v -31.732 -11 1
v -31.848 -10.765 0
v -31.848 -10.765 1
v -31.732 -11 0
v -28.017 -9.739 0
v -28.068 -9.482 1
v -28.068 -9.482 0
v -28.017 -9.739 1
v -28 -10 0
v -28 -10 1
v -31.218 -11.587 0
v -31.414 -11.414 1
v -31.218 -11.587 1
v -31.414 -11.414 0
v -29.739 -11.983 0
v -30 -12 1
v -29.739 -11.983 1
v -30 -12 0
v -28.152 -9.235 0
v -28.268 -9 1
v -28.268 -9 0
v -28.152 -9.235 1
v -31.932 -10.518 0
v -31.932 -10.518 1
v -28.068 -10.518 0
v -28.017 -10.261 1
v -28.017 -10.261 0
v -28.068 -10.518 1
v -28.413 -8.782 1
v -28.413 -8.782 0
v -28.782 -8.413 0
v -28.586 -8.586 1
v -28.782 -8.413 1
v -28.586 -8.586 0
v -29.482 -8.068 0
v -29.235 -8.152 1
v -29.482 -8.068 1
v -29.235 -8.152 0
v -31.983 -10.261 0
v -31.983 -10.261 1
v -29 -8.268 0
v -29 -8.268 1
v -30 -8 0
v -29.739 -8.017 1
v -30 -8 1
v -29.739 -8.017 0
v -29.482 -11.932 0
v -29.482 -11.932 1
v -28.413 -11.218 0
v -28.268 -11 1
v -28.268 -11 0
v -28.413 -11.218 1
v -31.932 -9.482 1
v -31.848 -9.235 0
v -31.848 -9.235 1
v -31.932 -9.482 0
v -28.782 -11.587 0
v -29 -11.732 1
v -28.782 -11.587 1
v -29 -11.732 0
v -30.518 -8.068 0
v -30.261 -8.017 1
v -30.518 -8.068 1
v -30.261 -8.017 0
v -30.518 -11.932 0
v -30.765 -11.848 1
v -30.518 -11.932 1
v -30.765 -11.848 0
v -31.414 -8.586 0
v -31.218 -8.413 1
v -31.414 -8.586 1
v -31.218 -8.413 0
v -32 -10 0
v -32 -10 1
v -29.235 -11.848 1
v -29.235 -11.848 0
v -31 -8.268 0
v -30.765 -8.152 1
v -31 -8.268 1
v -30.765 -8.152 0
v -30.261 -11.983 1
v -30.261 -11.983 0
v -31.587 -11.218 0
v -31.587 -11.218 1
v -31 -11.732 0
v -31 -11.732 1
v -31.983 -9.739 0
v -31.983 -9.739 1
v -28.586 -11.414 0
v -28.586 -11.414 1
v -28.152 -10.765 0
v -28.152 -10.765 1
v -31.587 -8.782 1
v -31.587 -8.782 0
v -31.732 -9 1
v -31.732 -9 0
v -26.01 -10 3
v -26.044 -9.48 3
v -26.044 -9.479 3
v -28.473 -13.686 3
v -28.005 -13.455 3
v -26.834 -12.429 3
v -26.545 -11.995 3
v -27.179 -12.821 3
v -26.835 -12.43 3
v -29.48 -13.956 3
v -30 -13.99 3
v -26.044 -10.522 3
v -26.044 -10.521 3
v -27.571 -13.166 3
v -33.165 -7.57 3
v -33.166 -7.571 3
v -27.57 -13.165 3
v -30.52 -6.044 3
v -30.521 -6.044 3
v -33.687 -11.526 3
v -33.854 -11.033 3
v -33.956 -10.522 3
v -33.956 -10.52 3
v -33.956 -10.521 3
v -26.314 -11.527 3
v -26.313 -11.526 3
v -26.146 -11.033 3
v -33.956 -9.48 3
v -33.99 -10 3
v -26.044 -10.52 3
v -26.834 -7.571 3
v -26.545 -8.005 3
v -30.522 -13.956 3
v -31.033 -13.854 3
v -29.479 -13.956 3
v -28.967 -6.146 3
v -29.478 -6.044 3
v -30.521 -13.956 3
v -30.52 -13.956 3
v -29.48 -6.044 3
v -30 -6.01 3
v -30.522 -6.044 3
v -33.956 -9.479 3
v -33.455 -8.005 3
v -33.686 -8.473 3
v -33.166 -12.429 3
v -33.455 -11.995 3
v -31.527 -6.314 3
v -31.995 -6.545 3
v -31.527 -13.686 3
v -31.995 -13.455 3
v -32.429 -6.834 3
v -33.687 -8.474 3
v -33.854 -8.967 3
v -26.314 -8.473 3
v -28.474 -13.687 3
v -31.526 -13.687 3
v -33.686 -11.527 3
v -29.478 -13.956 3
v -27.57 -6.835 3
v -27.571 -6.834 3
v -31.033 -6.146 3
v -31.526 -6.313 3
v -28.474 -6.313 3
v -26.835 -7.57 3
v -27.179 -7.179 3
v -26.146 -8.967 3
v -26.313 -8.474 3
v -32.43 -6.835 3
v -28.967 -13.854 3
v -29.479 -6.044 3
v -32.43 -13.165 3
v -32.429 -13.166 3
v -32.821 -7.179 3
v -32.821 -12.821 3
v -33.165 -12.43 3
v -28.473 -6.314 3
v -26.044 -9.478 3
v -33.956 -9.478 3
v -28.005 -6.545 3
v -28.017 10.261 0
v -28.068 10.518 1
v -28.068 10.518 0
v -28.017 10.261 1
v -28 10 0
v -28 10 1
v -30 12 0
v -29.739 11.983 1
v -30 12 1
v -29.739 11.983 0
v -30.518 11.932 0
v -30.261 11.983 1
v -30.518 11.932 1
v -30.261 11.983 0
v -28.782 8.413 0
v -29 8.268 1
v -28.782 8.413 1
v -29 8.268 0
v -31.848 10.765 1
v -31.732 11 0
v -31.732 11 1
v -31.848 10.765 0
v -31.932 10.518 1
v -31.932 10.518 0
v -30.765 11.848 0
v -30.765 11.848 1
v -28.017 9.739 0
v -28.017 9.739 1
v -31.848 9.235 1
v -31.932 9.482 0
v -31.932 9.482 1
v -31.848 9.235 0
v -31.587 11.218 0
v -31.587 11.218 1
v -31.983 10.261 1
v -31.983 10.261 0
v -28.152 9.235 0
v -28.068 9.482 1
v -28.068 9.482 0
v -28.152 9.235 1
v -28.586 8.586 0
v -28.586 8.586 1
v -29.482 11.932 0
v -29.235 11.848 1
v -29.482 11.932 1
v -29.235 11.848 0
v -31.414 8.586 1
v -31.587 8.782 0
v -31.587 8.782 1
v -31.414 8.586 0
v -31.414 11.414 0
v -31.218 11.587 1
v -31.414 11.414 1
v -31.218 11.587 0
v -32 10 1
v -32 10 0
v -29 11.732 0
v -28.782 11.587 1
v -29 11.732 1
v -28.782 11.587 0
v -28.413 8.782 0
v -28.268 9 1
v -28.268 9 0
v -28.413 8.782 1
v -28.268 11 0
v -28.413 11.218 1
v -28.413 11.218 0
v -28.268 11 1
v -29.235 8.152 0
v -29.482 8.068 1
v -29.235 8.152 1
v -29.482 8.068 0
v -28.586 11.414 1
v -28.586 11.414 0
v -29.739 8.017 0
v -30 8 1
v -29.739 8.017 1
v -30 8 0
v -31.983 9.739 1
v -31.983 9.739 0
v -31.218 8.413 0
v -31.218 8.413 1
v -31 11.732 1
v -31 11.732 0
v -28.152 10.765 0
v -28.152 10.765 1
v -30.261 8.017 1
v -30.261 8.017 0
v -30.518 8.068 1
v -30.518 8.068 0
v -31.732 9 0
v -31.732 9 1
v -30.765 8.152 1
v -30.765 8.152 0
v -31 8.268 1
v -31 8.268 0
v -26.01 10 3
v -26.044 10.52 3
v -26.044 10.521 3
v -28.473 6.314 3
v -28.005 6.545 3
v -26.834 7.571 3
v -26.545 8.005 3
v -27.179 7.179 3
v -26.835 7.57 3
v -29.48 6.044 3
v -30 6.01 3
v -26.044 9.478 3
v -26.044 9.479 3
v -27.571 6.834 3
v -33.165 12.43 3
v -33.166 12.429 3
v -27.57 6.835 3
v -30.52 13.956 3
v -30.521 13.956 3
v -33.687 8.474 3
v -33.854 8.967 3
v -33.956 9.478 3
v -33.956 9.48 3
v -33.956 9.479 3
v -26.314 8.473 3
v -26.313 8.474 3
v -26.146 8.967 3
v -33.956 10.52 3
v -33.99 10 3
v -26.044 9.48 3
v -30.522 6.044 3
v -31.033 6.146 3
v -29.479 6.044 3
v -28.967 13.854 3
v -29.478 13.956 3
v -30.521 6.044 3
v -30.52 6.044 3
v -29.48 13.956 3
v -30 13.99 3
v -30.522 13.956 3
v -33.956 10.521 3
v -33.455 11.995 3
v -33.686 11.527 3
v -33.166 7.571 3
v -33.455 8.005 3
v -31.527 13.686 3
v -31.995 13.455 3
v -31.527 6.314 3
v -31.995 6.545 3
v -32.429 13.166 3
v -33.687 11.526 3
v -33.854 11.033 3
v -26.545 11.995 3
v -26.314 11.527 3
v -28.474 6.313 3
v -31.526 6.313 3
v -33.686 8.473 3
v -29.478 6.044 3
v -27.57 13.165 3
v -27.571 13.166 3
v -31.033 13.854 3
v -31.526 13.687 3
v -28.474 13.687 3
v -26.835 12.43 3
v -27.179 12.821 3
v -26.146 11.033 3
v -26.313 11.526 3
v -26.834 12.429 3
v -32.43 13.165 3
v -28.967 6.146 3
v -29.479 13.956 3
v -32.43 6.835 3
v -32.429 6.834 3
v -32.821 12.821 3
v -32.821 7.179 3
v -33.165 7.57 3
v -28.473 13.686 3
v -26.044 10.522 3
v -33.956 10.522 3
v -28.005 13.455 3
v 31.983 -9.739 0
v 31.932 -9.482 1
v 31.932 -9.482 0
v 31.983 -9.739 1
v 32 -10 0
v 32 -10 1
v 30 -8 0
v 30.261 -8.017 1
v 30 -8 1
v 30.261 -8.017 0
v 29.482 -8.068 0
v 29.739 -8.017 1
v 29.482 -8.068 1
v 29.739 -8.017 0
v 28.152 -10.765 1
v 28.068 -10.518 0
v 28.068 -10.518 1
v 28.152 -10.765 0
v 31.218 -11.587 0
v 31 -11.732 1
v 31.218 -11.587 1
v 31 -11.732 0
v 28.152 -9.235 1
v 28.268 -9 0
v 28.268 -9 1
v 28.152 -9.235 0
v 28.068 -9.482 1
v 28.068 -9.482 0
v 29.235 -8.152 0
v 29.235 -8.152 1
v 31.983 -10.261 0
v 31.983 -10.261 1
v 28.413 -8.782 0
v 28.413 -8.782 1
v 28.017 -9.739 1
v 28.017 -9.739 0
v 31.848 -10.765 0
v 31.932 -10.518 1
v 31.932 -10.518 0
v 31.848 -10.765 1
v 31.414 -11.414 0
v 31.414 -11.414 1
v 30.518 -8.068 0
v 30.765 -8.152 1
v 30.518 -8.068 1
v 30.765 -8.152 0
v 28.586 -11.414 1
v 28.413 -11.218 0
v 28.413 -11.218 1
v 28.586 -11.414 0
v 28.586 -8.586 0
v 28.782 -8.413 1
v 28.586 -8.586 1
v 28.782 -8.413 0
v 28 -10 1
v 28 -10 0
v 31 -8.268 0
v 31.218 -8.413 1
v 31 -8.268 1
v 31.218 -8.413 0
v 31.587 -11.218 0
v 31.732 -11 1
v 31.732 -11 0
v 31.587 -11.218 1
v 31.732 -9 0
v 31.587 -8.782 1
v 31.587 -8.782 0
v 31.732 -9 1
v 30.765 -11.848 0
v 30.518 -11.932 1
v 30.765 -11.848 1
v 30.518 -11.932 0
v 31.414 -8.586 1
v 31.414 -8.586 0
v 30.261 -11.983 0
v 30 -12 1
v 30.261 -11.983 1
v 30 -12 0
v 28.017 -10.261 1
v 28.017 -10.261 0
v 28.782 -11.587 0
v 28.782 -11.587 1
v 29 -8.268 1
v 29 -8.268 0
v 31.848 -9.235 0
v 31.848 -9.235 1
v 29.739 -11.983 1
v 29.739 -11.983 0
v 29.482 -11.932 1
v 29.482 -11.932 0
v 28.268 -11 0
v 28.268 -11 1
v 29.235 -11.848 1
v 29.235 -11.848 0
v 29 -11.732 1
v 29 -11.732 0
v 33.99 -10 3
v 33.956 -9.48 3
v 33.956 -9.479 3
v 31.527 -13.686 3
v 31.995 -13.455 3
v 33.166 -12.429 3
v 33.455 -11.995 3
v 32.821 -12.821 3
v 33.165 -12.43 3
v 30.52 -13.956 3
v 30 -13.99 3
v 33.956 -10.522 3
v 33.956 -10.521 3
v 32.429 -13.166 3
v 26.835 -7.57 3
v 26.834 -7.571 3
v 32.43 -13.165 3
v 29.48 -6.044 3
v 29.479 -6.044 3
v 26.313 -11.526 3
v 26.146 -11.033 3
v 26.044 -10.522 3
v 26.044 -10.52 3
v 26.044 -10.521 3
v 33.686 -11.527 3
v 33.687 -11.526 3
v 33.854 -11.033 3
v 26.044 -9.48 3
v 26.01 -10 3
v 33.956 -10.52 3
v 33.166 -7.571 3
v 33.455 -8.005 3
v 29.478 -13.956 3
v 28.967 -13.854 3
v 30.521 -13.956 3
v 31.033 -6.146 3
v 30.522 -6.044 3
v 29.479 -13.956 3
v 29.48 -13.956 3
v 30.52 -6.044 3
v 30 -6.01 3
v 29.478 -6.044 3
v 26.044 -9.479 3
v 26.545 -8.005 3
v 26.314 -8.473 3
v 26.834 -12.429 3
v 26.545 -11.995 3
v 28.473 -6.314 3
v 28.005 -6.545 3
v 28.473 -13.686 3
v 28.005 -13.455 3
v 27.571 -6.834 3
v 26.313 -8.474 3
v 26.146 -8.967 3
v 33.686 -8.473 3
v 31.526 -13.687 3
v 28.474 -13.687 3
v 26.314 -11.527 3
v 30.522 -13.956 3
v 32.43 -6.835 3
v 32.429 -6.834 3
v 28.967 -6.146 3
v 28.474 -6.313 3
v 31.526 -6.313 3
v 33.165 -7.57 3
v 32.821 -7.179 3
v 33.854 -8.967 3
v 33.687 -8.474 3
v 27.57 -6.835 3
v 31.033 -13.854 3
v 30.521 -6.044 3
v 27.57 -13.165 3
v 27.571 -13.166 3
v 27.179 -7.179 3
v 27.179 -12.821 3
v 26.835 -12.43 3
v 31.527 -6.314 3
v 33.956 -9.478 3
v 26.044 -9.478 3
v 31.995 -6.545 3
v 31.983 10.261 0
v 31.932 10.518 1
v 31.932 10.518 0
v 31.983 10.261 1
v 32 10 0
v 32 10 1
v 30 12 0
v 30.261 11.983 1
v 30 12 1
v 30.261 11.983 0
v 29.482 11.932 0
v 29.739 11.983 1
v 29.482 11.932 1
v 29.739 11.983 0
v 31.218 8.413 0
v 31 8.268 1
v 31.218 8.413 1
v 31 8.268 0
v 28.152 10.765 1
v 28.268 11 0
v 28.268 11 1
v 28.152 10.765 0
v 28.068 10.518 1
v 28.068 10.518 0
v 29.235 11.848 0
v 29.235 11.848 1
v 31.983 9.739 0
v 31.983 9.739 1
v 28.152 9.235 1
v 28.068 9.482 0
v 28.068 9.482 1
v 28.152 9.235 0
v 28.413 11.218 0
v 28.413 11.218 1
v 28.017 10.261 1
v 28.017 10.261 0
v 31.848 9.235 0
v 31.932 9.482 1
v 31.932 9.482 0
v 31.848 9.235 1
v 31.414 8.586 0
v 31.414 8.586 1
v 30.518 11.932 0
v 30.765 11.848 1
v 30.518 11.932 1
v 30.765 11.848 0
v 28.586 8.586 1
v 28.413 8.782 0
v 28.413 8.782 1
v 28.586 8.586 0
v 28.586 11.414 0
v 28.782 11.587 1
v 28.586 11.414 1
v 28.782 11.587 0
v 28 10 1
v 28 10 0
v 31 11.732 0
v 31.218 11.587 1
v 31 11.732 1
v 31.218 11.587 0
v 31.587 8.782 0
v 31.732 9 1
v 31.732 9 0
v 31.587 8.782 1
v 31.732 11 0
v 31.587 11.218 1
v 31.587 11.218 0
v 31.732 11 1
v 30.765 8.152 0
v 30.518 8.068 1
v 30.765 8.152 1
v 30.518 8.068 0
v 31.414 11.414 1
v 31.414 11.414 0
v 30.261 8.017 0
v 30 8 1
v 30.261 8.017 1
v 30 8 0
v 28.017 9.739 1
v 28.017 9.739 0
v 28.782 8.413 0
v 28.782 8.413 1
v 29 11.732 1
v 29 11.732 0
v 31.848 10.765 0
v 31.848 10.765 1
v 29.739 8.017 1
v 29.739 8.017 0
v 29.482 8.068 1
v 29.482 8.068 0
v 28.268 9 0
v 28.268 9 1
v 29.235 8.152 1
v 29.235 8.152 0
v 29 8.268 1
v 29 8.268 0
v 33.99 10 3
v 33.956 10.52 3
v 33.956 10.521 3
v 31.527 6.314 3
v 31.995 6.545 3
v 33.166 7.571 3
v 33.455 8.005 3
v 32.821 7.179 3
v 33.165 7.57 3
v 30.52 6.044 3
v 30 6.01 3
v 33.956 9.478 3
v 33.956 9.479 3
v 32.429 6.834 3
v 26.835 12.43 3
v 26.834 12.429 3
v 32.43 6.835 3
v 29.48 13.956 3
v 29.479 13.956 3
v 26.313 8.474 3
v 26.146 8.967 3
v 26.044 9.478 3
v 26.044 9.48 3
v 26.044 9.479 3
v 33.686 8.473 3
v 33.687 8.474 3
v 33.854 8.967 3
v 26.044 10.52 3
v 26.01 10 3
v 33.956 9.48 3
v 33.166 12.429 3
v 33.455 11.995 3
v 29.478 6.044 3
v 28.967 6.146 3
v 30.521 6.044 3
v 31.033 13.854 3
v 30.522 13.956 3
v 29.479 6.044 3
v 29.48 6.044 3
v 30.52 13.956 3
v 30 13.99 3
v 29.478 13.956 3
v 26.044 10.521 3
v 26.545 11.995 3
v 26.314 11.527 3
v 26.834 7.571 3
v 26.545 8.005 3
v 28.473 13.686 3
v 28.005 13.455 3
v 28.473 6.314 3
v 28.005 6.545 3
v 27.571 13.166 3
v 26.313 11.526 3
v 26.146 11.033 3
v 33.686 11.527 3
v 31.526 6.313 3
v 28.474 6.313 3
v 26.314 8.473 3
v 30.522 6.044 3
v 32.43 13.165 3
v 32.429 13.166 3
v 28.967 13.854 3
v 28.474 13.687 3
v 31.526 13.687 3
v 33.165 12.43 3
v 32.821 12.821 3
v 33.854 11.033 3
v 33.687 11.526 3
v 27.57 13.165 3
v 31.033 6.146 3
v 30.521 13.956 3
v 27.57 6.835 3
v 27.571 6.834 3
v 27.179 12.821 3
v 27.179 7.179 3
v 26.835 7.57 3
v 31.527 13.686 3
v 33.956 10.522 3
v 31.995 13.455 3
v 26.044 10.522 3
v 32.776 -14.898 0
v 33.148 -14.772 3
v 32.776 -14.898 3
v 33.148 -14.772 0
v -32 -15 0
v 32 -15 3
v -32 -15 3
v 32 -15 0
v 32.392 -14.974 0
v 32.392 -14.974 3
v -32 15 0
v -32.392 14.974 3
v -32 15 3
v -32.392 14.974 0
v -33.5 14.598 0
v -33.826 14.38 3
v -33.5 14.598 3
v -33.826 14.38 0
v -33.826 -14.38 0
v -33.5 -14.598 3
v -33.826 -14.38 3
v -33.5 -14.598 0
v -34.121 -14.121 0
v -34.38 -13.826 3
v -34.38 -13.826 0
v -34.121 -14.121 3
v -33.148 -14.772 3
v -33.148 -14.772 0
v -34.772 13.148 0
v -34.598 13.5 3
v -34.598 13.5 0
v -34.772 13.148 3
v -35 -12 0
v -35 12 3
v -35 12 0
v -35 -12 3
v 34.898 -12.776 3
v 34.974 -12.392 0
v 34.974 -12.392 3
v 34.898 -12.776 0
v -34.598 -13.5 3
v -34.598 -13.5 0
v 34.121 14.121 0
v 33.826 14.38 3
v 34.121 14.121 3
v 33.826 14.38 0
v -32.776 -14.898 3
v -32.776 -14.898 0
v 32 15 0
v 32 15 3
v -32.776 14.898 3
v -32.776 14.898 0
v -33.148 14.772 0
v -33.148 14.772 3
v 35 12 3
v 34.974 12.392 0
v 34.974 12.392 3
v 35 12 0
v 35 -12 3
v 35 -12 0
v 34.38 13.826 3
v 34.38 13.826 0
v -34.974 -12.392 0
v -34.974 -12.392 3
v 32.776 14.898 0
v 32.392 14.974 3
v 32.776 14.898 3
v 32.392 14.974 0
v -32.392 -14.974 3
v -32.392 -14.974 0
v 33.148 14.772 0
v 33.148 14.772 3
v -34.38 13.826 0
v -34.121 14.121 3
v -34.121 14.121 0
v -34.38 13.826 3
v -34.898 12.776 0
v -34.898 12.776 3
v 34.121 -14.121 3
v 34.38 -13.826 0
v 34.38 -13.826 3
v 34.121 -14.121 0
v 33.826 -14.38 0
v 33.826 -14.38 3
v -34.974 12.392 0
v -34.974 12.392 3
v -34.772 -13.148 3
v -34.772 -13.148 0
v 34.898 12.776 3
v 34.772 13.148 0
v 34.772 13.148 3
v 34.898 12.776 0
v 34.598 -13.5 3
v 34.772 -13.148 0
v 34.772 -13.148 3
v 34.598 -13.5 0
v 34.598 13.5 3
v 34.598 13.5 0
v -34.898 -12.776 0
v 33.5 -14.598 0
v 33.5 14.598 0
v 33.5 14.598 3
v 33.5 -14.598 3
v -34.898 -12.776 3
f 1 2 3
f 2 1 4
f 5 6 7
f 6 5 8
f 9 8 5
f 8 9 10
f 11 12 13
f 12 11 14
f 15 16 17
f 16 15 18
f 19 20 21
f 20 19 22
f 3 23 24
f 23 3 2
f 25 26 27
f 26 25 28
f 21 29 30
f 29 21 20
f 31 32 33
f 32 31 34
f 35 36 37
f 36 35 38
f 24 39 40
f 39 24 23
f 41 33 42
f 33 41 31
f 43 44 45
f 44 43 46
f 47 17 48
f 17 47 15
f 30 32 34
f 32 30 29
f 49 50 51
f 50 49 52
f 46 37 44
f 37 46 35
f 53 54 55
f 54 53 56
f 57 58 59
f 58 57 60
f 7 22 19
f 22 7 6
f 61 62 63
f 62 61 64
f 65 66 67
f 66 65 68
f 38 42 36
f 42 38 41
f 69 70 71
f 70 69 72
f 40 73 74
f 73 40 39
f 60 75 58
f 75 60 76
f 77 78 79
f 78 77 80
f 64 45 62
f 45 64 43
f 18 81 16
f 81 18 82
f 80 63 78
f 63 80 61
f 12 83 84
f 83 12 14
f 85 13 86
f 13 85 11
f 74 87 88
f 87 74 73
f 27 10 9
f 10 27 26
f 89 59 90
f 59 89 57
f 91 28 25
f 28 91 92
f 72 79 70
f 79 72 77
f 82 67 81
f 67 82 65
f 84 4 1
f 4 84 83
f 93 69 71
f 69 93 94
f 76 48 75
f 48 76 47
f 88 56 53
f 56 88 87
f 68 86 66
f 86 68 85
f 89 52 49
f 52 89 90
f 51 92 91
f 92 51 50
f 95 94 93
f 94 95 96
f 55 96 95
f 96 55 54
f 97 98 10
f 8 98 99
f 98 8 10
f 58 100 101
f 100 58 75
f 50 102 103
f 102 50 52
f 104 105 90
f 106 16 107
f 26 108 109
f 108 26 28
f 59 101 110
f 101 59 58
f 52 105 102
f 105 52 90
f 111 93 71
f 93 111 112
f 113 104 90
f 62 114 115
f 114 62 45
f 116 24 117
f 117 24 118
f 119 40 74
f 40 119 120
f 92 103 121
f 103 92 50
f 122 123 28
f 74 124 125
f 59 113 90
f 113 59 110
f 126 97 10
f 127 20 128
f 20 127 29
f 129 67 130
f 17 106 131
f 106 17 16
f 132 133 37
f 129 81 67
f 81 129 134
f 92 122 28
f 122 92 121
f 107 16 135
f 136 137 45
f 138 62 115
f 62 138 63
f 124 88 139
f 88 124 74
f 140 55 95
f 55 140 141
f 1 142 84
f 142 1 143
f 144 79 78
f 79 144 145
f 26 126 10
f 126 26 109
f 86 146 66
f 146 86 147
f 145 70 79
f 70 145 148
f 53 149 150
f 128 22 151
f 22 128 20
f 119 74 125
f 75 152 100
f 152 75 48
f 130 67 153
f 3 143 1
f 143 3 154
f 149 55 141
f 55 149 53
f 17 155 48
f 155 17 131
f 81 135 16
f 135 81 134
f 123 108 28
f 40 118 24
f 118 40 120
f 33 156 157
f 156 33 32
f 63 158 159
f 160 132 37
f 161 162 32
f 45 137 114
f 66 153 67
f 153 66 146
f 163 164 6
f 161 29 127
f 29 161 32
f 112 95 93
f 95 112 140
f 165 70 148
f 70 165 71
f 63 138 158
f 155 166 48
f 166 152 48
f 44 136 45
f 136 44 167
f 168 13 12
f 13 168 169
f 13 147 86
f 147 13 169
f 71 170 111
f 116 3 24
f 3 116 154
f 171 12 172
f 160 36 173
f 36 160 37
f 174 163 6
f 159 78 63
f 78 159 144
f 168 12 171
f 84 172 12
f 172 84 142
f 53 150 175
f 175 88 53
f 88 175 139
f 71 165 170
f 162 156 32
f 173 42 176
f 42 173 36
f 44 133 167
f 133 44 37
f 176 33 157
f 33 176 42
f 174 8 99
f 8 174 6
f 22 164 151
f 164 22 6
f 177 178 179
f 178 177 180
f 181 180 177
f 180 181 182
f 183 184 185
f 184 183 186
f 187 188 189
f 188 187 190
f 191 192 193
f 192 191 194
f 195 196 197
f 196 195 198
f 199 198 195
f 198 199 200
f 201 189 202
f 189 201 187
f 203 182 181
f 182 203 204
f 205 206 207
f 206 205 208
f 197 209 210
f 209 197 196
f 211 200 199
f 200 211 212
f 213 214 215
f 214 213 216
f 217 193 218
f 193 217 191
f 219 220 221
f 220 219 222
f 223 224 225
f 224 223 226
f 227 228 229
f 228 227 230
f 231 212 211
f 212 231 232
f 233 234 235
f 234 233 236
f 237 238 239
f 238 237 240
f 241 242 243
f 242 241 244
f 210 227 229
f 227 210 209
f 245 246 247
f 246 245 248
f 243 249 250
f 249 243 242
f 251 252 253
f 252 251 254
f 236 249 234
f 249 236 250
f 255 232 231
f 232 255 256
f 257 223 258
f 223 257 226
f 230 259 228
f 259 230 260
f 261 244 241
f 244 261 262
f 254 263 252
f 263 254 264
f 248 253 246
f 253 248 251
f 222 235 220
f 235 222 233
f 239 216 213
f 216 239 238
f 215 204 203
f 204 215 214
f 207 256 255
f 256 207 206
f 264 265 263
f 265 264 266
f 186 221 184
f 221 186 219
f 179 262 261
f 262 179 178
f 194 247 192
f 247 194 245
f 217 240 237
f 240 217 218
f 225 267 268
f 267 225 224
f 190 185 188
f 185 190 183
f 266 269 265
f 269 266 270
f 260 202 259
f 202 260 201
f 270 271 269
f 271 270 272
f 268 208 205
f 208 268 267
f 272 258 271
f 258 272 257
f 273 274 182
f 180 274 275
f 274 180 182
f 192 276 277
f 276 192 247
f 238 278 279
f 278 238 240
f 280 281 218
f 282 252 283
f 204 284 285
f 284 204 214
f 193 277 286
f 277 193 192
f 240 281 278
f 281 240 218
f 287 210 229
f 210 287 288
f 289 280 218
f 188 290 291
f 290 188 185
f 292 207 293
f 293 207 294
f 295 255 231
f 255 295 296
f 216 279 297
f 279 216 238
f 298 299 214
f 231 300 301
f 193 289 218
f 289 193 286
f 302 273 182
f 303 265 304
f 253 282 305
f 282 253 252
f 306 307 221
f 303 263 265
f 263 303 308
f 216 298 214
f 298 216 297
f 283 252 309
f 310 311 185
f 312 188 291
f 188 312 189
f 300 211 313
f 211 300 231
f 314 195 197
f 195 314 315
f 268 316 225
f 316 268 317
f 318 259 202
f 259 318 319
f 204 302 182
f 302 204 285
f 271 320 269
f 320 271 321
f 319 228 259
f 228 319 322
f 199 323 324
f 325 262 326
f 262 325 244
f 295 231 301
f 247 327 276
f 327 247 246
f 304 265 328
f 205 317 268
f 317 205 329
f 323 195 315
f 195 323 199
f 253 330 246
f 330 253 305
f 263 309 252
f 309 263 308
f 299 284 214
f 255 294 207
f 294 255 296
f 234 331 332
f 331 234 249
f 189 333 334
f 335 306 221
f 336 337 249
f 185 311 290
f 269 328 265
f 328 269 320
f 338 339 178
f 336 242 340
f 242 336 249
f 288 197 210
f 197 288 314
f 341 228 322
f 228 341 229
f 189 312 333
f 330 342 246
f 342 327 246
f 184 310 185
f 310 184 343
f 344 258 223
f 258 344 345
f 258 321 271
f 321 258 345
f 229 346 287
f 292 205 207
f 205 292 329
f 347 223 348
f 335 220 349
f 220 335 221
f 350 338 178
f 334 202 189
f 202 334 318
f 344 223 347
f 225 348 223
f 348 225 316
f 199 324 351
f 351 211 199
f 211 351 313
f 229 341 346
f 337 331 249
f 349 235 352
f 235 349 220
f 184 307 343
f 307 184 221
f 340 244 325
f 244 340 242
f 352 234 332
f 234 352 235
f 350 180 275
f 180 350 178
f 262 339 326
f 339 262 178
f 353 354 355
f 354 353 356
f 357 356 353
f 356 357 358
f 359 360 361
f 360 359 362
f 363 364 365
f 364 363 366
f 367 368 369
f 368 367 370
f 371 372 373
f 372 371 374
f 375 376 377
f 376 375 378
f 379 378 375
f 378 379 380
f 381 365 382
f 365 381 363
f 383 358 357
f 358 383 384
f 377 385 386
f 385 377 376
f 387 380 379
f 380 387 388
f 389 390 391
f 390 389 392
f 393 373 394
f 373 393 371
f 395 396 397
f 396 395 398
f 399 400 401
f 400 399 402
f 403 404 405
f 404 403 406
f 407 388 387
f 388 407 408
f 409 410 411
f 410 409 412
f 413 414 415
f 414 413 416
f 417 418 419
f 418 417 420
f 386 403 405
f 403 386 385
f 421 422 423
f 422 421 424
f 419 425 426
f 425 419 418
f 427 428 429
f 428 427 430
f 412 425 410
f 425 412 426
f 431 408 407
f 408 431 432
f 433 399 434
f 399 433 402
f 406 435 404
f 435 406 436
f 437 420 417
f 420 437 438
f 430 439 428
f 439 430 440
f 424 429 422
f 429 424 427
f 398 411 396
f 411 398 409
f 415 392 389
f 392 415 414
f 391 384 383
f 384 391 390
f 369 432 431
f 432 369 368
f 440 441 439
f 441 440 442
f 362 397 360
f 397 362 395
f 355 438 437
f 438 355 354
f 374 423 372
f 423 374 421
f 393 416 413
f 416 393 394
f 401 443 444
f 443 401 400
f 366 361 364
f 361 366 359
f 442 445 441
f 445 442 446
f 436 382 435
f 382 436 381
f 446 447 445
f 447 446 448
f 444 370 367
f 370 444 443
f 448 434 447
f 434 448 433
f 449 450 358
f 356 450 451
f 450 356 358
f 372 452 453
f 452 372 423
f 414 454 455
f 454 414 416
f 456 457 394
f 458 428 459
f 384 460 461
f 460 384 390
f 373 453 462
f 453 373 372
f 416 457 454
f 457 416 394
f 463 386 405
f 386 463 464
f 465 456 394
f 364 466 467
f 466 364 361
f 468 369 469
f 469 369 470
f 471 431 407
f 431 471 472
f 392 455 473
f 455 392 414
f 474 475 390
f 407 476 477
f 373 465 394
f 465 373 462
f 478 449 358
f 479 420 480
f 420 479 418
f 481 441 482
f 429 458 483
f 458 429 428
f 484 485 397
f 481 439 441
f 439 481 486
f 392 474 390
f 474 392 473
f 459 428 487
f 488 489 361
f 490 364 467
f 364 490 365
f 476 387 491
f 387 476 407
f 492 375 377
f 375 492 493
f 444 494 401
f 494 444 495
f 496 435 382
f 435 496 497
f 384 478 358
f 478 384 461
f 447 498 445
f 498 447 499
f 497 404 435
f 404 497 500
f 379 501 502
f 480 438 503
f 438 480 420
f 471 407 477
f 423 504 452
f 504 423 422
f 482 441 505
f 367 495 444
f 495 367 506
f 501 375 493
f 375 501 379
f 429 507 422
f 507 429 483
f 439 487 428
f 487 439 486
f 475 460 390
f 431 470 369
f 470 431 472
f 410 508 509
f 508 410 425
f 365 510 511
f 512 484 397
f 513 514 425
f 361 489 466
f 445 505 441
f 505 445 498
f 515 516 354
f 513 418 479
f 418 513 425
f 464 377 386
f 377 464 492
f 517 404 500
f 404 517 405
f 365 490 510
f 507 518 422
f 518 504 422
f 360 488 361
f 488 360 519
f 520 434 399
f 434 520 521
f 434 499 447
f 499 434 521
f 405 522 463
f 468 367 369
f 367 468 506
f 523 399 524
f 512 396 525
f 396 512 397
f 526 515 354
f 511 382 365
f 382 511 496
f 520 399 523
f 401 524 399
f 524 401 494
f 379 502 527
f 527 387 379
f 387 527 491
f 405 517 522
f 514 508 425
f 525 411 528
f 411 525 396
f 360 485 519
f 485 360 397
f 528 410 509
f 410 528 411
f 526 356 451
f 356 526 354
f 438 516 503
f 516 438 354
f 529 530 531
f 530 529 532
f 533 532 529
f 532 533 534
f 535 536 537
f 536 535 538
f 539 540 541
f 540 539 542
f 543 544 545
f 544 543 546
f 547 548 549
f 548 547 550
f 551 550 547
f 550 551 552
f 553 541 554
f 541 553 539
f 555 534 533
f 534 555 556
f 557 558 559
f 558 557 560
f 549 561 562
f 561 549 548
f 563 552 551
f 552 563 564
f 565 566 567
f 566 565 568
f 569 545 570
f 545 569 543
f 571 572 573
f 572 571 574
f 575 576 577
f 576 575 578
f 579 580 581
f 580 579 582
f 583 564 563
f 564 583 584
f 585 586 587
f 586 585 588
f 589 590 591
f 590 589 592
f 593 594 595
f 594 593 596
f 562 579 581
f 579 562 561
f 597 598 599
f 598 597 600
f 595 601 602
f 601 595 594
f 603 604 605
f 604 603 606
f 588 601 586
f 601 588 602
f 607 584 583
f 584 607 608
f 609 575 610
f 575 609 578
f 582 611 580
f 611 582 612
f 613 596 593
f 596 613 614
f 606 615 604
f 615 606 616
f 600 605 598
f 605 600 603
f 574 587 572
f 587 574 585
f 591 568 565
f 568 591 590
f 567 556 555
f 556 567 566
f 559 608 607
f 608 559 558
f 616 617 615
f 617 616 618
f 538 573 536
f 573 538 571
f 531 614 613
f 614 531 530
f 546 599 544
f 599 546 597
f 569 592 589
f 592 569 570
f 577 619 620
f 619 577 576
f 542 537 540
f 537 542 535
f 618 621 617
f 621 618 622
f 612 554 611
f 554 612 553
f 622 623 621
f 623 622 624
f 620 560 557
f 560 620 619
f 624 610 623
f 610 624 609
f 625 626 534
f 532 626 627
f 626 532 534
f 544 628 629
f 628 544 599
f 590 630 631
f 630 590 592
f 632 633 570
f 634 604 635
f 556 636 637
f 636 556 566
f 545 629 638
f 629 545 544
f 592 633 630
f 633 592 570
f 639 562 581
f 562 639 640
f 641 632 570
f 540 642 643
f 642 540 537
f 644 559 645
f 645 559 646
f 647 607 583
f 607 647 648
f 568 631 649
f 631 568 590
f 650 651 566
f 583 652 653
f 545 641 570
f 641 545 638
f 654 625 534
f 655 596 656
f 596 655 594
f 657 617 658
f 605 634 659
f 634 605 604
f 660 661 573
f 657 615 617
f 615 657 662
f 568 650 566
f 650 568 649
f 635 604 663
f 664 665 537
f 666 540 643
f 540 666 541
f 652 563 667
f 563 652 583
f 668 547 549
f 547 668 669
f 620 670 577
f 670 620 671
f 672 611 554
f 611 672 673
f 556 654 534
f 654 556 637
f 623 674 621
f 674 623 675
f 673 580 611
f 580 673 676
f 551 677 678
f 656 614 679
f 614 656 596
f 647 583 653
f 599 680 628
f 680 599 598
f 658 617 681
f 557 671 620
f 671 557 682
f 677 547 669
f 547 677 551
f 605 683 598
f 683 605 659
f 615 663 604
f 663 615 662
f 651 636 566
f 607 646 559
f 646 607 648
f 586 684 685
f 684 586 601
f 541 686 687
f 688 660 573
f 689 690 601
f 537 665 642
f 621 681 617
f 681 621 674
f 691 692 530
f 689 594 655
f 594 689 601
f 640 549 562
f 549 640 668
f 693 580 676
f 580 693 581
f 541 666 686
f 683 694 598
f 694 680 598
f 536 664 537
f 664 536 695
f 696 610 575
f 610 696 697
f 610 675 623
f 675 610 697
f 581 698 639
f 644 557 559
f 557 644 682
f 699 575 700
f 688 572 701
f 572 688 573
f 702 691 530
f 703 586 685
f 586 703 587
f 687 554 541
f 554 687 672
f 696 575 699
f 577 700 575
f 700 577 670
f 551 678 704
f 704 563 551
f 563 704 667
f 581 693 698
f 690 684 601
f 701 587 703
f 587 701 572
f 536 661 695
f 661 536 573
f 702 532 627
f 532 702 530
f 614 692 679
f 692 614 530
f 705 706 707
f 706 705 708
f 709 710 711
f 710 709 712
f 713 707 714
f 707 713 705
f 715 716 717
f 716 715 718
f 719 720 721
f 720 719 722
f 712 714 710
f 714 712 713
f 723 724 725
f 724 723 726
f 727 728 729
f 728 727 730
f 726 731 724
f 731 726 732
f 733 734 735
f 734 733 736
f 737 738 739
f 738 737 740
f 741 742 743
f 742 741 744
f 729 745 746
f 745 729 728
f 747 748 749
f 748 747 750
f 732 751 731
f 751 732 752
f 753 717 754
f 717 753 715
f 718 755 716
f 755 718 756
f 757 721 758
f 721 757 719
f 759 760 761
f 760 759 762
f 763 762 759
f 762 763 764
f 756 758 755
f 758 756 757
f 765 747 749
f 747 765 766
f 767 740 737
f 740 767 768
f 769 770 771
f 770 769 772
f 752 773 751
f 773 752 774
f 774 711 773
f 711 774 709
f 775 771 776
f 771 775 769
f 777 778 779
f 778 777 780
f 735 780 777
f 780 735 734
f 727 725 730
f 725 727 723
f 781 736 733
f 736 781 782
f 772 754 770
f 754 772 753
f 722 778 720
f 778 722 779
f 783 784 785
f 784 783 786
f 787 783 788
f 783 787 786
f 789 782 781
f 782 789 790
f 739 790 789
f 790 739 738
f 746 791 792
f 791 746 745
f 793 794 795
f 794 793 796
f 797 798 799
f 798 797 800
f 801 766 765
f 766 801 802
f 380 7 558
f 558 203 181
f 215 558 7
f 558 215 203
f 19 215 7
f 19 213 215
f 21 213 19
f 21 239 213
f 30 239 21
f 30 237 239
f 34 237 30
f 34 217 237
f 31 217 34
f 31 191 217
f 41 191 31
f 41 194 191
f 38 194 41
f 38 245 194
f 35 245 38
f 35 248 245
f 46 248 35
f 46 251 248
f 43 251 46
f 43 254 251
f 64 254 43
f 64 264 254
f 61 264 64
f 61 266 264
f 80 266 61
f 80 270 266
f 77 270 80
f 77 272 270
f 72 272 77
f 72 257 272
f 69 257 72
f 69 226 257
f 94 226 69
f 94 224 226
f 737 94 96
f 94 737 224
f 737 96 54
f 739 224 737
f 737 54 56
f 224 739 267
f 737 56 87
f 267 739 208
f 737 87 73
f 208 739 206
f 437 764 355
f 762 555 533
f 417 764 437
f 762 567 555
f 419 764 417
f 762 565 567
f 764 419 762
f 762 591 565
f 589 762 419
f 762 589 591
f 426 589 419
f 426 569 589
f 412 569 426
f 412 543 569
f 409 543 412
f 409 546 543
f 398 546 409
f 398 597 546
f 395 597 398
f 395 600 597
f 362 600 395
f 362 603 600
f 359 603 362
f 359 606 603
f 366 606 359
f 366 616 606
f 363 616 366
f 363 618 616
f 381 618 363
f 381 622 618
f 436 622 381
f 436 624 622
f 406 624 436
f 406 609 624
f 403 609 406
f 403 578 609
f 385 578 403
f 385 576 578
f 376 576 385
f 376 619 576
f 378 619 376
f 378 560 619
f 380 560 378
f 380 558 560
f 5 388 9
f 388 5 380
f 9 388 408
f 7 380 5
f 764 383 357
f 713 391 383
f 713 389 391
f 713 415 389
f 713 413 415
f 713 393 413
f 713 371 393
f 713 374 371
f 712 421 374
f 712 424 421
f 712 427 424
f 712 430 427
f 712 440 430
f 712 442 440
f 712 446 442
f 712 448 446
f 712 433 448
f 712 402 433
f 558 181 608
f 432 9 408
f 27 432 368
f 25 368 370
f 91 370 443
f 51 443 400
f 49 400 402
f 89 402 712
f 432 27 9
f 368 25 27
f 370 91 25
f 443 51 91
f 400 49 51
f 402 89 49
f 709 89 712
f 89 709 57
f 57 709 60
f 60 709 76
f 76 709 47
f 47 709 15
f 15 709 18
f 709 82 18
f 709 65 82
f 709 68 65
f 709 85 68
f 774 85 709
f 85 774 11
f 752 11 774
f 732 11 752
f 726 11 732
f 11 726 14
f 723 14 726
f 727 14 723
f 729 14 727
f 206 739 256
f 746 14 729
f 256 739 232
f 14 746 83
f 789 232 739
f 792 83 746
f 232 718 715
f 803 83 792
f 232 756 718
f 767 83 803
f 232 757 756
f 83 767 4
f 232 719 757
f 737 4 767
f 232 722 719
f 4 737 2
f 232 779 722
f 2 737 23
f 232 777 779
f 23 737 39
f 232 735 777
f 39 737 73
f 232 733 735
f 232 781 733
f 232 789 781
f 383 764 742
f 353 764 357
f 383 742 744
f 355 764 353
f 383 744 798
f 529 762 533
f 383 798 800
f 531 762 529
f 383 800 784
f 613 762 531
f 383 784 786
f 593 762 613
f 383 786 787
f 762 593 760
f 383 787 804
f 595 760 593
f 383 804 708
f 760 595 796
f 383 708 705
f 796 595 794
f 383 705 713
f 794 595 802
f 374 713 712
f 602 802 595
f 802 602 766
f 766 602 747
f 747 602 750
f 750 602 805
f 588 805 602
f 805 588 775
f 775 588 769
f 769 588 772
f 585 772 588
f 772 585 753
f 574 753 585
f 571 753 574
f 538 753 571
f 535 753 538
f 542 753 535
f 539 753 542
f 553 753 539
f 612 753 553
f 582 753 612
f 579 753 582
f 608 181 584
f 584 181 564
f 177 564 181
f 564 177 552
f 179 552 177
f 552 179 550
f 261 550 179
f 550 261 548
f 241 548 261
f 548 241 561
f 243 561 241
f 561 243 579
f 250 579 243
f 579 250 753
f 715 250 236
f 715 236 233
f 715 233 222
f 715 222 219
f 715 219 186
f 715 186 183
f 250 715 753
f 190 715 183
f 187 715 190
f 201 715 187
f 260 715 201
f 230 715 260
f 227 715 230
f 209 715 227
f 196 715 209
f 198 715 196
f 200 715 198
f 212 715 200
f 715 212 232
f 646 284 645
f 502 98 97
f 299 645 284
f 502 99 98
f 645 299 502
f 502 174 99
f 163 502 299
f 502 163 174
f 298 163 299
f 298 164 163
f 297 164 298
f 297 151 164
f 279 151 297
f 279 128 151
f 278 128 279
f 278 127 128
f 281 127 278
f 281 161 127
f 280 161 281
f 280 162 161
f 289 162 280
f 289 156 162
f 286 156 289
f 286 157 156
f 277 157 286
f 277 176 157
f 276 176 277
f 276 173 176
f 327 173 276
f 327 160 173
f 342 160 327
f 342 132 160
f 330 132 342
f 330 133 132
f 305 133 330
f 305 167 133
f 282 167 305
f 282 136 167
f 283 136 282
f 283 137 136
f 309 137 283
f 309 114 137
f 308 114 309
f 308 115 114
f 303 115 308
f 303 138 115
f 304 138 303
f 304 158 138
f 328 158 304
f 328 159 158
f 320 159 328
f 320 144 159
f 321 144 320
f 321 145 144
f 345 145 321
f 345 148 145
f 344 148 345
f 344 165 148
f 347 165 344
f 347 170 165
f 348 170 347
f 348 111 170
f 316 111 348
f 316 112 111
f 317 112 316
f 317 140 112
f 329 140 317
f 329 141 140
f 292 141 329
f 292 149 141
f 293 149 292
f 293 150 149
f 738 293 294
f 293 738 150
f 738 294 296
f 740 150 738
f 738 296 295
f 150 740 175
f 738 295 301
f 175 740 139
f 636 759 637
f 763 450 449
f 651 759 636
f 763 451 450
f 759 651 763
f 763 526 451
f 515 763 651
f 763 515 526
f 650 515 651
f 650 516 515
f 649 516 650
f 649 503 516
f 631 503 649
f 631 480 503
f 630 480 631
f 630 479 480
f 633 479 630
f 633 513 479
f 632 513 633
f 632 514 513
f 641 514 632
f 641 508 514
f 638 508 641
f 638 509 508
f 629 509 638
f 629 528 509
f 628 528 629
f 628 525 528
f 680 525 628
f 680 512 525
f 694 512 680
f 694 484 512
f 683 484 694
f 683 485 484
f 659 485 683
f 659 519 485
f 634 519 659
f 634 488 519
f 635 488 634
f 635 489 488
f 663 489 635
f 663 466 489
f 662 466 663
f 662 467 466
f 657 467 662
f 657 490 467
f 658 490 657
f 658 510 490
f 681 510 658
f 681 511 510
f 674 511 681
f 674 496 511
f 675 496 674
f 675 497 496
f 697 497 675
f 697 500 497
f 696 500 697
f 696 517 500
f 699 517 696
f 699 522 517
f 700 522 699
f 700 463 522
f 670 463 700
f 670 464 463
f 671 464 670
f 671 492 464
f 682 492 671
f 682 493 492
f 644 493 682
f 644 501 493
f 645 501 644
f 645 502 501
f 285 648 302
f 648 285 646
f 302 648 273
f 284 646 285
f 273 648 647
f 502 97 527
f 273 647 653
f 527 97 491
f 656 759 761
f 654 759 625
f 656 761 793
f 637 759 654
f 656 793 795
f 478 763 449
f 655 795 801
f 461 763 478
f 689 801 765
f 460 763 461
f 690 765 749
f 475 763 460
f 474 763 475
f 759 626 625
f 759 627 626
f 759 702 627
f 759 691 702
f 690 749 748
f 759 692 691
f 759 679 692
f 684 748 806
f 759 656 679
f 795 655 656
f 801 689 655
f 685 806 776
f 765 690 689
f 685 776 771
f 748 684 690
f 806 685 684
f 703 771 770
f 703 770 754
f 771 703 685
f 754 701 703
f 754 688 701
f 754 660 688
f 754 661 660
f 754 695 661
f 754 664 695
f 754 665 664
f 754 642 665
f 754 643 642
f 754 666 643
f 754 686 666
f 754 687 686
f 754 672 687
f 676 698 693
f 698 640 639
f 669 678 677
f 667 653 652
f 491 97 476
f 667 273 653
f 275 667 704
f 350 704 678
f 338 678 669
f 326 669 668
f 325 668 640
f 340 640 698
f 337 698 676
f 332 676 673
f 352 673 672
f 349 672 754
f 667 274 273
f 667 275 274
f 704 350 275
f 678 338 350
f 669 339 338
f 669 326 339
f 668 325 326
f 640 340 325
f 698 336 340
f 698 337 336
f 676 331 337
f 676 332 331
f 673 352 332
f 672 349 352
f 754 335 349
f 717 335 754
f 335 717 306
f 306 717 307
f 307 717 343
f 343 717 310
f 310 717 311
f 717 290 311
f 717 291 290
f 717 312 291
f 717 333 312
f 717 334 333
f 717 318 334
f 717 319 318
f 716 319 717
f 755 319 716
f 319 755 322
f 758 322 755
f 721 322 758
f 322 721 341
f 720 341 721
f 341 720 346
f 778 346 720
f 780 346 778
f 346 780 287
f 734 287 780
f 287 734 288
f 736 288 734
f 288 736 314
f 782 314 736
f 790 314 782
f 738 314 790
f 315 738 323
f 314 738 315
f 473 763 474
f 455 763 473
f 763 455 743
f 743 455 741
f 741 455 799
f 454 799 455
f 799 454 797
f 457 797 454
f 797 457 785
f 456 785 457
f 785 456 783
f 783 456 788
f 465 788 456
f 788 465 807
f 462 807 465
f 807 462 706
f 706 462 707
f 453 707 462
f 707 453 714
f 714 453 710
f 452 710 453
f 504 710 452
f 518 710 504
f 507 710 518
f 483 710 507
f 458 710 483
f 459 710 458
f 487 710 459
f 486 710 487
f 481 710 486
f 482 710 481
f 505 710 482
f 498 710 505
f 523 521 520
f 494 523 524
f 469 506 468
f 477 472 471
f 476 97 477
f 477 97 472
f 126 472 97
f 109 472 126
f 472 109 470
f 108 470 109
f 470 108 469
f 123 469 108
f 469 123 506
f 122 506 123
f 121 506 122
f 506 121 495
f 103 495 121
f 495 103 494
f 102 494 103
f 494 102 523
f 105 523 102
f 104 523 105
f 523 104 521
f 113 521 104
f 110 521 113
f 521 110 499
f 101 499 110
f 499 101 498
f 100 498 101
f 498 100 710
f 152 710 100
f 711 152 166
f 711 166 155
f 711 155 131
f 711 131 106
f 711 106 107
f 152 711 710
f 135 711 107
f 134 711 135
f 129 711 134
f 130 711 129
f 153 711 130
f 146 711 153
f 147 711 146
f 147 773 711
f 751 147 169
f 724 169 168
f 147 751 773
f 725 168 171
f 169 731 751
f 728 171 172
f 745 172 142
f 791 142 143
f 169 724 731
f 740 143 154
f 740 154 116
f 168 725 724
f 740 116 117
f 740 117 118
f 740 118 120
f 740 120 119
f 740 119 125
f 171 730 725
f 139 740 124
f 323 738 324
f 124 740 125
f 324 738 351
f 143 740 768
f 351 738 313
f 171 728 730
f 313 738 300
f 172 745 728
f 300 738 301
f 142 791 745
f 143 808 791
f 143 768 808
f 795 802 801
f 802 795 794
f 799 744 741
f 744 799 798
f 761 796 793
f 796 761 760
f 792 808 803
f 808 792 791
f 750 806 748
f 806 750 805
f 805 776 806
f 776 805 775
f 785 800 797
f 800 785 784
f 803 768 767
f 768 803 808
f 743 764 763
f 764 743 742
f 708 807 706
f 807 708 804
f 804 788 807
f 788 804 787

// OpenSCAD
// Rounded mounting plate - a flat plate with rounded corners and a countersunk screw hole near each
// corner. Teaches 2D corner rounding with offset() and a countersink (chamfered hole). NOVEL part.
//
// @desc flat plate, rounded corners, countersunk holes
// @prompt Design a mounting plate in OpenSCAD: {L} by {W} mm and {t} mm thick, with {r} mm rounded corners and a countersunk hole for an {screw} mm screw near each corner. Reply with a single complete OpenSCAD file.
// @param L     length, mm           [40:120]
// @param W     width, mm            [30:90]
// @param t     thickness, mm        [3:8]
// @param r     corner radius, mm    [3:12]
// @param screw screw diameter, mm   [3:6]

L     = 70;
W     = 30;
t     = 3;
r     = 3;
screw = 4;

$fn = 48;

inset = r + 2;                     // hole-centre inset from the edges
head  = screw * 2;                 // countersink top diameter
csk   = min(screw, t - 1);         // countersink depth

module rounded_rect(l, w, rad) {
    offset(r = rad) square([l - 2 * rad, w - 2 * rad], center = true);
}

difference() {
    linear_extrude(t) rounded_rect(L, W, r);
    for (sx = [-1, 1], sy = [-1, 1])
        translate([sx * (L / 2 - inset), sy * (W / 2 - inset), 0]) {
            translate([0, 0, -1]) cylinder(h = t + 2, d = screw);                       // shank
            translate([0, 0, t - csk]) cylinder(h = csk + 0.01, d1 = screw, d2 = head); // countersink
        }
}
